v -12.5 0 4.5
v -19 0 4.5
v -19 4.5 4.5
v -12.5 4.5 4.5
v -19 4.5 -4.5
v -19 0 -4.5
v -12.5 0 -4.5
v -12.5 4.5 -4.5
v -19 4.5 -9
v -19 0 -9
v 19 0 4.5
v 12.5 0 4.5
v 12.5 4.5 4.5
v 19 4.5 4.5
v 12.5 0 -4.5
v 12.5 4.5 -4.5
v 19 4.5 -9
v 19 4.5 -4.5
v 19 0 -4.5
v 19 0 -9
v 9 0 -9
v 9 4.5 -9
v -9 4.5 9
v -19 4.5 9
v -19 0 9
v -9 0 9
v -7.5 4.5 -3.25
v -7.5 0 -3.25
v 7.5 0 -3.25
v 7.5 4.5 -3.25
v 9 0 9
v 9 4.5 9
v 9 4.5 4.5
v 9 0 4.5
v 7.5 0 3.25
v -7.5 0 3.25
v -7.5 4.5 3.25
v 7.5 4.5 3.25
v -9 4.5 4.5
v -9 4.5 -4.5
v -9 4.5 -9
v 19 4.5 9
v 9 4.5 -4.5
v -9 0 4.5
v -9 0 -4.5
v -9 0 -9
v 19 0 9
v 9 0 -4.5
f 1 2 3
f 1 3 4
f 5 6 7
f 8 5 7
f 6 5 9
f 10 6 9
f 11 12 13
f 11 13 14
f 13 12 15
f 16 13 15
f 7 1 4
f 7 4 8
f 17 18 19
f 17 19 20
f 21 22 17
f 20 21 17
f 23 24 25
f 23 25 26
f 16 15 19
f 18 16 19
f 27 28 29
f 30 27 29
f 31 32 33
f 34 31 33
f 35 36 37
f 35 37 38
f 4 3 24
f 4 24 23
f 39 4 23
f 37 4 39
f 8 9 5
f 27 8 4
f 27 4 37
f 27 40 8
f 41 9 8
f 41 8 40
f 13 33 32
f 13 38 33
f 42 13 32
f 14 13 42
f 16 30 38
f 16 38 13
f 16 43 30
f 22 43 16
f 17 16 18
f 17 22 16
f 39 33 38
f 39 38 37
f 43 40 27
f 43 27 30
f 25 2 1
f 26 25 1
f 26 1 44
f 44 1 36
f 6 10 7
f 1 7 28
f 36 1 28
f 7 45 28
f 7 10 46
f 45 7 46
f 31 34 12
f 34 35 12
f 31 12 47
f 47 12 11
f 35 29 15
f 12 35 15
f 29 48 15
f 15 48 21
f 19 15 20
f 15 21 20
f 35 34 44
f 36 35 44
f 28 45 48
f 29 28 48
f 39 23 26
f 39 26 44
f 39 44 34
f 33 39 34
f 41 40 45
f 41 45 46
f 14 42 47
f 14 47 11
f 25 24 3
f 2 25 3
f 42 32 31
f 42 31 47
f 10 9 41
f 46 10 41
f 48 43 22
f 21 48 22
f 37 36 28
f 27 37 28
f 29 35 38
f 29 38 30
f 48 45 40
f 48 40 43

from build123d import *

# Parameters (mm, degrees)
SKETCH1_W               = 55
SKETCH1_H               = 9
BOSS_EXTRUDE1_DEPTH     = 4.5
SKETCH2_W               = 10
SKETCH2_H               = 4.5
BOSS_EXTRUDE2_DEPTH     = 4.5
CUT_EXTRUDE1_DEPTH      = 30.283100929
CUT_EXTRUDE1_DEPTH_BACK = 30.283100929
SKETCH3_W               = 30
SKETCH3_H               = 9
SKETCH3_W_2             = 15
SKETCH3_H_2             = 6.5


with BuildPart() as part:
    # Sketch1 → Boss-Extrude1 (new body)
    with BuildSketch(Plane(origin=(0, 0, 0), x_dir=(1, 0, 0), z_dir=(0, 1, 0))):
        Rectangle(SKETCH1_W, SKETCH1_H)
    extrude(amount=BOSS_EXTRUDE1_DEPTH)

    # Sketch2 → Boss-Extrude2 (add, through all)
    with BuildSketch(Plane(origin=(0, 4.5, 0), x_dir=(1, 0, 0), z_dir=(0, 1, 0))):
        with Locations((-14, -6.75)):
            Rectangle(SKETCH2_W, SKETCH2_H)
        with Locations((14, -6.75)):
            Rectangle(SKETCH2_W, SKETCH2_H)
        with Locations((14, 6.75)):
            Rectangle(SKETCH2_W, SKETCH2_H)
        with Locations((-14, 6.75)):
            Rectangle(SKETCH2_W, SKETCH2_H)
    extrude(amount=-BOSS_EXTRUDE2_DEPTH)

    # Sketch3 → Cut-Extrude1 (cut, two sides: drawn at the far end of the back side and taken through both)
    with BuildSketch(Plane(origin=(0, 4.5, 0), x_dir=(1, 0, 0), z_dir=(0, 1, 0)).offset(-CUT_EXTRUDE1_DEPTH_BACK)):
        with Locations((-27.5, 0)):
            Rectangle(SKETCH3_W, SKETCH3_H)
        with Locations((27.5, 0)):
            Rectangle(SKETCH3_W, SKETCH3_H)
        Rectangle(SKETCH3_W_2, SKETCH3_H_2)
    extrude(amount=CUT_EXTRUDE1_DEPTH + CUT_EXTRUDE1_DEPTH_BACK, mode=Mode.SUBTRACT)


solid = part.part
